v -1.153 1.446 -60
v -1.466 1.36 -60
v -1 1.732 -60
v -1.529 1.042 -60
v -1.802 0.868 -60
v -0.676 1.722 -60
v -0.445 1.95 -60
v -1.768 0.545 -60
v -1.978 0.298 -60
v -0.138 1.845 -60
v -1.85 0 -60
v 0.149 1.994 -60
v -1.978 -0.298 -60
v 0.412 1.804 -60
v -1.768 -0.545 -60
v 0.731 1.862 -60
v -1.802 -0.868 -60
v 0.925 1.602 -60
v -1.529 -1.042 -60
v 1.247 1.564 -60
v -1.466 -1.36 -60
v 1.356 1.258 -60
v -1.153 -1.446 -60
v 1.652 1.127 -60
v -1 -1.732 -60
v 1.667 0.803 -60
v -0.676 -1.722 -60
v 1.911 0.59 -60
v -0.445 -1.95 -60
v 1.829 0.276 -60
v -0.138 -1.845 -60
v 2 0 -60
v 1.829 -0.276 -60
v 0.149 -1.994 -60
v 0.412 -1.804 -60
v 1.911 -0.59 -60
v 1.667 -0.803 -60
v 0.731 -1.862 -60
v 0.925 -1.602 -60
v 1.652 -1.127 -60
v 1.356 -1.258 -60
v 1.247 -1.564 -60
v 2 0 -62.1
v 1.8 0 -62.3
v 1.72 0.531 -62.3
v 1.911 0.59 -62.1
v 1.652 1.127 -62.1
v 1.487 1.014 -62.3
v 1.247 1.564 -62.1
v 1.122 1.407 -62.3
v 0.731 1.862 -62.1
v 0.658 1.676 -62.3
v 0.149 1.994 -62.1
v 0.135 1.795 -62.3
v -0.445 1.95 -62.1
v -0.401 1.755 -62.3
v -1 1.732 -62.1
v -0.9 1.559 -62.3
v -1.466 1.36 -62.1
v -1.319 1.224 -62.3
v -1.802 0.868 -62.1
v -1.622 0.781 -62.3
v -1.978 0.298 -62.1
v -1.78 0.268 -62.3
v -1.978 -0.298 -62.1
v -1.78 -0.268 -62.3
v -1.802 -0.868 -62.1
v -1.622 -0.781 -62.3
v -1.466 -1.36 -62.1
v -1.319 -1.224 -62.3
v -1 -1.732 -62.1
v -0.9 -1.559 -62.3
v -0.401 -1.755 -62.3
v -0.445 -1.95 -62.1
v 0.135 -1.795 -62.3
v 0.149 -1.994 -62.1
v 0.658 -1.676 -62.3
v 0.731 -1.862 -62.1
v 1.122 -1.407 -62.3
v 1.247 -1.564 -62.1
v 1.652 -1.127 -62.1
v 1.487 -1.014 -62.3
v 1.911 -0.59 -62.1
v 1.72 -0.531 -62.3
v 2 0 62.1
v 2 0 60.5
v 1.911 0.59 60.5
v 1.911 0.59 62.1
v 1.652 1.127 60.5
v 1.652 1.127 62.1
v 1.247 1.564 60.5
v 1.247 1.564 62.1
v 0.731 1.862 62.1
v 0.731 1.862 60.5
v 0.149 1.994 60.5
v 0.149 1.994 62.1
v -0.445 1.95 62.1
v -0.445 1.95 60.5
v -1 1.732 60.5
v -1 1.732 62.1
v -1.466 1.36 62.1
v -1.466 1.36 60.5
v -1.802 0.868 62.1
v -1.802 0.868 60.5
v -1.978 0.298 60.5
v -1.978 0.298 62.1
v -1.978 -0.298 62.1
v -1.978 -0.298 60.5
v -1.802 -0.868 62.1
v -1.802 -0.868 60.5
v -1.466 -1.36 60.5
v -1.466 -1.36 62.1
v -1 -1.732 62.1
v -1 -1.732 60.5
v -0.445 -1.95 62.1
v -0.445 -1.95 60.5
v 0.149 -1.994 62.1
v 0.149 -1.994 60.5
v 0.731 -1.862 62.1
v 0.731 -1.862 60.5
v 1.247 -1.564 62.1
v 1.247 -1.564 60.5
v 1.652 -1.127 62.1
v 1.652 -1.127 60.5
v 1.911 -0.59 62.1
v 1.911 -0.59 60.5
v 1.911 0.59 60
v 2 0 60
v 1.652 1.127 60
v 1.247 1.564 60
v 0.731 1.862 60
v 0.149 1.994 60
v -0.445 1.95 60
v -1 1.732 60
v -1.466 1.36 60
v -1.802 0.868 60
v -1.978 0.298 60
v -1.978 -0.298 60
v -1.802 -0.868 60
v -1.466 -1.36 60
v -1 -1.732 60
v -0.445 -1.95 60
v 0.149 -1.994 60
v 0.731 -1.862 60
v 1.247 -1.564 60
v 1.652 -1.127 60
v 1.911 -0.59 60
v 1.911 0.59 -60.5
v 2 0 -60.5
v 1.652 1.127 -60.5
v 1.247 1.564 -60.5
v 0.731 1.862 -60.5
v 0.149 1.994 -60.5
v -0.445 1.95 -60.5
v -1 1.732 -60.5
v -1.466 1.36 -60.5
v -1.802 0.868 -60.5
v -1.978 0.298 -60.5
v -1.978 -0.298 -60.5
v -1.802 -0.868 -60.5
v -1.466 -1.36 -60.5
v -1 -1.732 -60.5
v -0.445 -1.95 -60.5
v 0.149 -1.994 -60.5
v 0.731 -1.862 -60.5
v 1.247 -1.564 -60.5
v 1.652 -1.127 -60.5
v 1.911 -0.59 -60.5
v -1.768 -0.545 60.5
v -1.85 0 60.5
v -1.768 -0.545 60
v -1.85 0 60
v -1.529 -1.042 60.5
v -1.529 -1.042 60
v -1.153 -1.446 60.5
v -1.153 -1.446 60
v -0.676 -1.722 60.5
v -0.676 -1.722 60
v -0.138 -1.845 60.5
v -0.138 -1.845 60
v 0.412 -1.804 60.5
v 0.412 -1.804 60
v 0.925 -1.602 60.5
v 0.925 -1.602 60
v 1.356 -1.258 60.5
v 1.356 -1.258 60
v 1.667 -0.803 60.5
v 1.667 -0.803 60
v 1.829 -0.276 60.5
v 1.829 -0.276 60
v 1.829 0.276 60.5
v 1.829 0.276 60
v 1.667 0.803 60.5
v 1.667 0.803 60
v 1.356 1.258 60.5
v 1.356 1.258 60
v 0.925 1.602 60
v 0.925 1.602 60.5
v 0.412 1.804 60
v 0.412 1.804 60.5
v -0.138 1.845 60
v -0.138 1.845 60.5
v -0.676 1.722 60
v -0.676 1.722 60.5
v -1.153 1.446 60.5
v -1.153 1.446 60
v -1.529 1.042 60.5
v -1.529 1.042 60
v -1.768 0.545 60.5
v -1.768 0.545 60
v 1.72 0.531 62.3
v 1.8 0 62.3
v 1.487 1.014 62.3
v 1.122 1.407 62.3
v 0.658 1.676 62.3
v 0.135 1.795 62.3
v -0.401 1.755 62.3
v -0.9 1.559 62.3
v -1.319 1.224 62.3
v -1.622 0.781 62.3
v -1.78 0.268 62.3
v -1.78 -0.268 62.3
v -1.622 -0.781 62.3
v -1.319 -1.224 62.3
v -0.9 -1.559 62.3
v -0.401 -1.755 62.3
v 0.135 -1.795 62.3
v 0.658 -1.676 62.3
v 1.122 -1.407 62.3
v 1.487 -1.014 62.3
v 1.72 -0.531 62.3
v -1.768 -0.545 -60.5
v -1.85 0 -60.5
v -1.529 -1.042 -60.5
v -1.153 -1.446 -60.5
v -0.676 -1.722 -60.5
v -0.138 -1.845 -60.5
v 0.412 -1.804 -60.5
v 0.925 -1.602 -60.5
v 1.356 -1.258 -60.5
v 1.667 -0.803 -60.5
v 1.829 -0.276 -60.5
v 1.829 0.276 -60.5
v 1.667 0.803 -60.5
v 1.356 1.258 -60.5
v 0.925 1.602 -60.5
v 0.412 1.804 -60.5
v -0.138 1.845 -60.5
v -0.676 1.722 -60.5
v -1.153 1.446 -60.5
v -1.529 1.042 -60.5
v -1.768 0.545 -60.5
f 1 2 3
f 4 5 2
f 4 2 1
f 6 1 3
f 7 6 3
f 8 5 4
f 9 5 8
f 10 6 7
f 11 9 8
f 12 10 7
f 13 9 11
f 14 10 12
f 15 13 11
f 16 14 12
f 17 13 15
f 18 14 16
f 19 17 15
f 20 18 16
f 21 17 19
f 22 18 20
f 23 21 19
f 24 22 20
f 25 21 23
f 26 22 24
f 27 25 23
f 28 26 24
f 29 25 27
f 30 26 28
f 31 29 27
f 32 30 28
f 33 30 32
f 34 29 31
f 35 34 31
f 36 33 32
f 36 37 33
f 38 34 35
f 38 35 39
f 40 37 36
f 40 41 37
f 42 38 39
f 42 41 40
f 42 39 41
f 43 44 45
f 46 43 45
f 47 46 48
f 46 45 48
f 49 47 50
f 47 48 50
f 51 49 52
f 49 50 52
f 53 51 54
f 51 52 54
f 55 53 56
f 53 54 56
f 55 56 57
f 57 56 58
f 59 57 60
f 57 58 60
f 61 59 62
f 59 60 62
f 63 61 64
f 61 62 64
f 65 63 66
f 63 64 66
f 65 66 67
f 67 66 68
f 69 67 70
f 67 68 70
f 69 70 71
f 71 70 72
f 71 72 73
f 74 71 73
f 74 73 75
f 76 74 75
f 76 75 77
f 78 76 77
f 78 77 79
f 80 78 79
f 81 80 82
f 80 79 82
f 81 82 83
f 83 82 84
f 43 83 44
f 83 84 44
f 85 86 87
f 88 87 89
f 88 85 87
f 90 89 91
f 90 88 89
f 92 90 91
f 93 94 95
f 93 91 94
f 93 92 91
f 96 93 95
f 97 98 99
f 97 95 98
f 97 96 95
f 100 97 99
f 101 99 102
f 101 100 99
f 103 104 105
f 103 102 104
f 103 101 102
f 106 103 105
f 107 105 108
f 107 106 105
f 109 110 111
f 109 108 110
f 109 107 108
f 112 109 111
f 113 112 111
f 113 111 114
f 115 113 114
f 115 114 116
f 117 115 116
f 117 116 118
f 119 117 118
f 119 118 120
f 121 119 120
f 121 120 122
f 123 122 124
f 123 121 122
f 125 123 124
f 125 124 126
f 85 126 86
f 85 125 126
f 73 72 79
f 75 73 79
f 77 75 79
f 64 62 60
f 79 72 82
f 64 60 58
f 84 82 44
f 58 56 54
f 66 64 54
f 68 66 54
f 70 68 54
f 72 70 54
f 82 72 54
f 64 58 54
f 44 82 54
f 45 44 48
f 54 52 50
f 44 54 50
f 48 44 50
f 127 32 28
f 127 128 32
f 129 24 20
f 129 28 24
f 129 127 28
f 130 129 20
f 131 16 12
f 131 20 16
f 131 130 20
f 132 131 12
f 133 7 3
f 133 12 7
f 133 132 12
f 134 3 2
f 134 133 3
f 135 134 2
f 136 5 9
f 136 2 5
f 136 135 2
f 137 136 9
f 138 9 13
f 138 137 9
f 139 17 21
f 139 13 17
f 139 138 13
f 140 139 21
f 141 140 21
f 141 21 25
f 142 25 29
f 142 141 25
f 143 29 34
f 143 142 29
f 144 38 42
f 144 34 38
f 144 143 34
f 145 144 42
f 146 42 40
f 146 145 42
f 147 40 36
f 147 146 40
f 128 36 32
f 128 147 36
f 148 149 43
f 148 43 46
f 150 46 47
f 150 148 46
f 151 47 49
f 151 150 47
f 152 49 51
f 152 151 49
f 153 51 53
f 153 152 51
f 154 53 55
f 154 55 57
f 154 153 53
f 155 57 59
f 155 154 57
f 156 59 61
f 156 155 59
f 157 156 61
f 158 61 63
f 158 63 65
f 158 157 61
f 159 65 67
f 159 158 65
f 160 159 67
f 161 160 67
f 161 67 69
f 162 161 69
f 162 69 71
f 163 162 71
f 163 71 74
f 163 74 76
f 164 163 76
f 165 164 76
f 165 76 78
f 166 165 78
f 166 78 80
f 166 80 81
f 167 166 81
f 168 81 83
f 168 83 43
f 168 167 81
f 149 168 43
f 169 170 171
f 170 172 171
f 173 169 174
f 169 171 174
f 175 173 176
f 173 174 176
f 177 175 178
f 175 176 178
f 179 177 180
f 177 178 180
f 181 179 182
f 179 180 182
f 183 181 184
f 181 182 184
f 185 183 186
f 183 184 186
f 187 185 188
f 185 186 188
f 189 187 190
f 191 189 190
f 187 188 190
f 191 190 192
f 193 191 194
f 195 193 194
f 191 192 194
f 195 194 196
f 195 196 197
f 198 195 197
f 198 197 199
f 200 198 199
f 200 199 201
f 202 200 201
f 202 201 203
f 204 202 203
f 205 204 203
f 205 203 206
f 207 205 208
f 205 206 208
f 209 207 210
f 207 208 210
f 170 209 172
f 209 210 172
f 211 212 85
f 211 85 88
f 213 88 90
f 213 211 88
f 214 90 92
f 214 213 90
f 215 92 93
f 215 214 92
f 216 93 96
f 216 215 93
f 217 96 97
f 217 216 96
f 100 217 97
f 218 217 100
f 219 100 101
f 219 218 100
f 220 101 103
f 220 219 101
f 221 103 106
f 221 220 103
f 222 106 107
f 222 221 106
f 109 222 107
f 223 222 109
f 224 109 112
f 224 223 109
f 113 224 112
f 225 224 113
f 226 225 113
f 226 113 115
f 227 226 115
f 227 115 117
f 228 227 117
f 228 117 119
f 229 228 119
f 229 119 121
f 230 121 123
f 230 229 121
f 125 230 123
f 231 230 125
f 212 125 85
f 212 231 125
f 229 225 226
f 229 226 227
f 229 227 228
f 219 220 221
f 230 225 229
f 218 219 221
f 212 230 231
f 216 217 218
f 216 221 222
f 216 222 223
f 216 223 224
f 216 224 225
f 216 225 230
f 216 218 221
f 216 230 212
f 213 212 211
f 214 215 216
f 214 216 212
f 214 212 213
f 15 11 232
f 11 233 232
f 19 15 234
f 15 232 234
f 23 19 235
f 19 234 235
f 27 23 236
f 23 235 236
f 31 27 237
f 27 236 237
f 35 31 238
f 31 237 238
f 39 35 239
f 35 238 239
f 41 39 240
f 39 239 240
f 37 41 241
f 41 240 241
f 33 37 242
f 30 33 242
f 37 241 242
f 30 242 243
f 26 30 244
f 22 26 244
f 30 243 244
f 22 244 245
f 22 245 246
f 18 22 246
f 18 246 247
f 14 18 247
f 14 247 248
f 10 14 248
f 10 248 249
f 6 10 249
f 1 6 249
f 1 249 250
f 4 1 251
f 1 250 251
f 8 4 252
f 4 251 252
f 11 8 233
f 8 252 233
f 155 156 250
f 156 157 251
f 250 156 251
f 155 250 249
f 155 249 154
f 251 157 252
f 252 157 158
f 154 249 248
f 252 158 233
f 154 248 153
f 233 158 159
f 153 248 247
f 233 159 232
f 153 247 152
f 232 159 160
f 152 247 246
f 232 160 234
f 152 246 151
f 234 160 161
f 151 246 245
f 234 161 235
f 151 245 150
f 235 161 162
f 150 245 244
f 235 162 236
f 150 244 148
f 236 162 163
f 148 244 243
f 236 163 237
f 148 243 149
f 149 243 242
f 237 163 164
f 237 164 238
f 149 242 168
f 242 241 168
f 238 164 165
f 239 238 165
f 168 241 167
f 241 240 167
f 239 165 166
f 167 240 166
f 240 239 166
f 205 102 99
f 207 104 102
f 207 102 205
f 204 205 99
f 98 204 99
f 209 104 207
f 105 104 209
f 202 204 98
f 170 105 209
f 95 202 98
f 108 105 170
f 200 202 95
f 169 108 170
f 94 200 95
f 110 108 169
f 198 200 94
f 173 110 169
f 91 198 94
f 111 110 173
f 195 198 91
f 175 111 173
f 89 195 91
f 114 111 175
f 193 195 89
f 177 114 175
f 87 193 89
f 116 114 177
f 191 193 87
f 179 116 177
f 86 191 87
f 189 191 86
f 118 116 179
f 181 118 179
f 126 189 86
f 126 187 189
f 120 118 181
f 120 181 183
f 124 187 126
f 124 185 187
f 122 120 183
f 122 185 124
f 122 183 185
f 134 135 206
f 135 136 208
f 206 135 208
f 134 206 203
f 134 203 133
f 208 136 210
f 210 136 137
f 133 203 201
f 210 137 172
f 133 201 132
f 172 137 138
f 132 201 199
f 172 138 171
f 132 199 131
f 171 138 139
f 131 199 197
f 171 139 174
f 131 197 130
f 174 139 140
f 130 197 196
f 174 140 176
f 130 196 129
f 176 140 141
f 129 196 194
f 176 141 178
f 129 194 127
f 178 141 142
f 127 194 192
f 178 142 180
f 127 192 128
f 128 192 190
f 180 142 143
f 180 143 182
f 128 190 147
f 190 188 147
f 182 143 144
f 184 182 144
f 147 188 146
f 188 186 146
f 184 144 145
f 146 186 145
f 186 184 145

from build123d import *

# Parameters (mm, degrees)
SKIZZE1_R                       = 2
AUFSATZ_LINEAR_AUSTRAGEN1_DEPTH = 62.3
SKIZZE7_W                       = 0.5
SKIZZE7_H                       = 0.15
FASE1_SIZE                      = 0.2


with BuildPart() as part:
    # Skizze1 → Aufsatz-Linear austragen1 (new, symmetric)
    with BuildSketch(Plane.XY):
        Circle(SKIZZE1_R)
    extrude(amount=AUFSATZ_LINEAR_AUSTRAGEN1_DEPTH, both=True)

    # Skizze7 → Schnitt-Rotation1 (revolve, cut)
    with BuildSketch(Plane(origin=(0, 0, 0), x_dir=(0, 0, -1), z_dir=(1, 0, 0)), mode=Mode.PRIVATE) as schnitt_rotation1_sk:
        with Locations((-60.25, 1.925)):
            Rectangle(SKIZZE7_W, SKIZZE7_H)
        with Locations((60.25, 1.925)):
            Rectangle(SKIZZE7_W, SKIZZE7_H)
    revolve(schnitt_rotation1_sk.sketch.rotate(Axis((0, 0, -62.3), (0, 0, 1)), 90), axis=Axis((0, 0, -62.3), (0, 0, 1)), mode=Mode.SUBTRACT)

    # Fase1
    fase1_edges = [part.edges().sort_by_distance(p)[0] for p in [
        (-2, 0, -62.3),
        (-2, 0, 62.3),
    ]]
    chamfer(fase1_edges, length=FASE1_SIZE)


solid = part.part
